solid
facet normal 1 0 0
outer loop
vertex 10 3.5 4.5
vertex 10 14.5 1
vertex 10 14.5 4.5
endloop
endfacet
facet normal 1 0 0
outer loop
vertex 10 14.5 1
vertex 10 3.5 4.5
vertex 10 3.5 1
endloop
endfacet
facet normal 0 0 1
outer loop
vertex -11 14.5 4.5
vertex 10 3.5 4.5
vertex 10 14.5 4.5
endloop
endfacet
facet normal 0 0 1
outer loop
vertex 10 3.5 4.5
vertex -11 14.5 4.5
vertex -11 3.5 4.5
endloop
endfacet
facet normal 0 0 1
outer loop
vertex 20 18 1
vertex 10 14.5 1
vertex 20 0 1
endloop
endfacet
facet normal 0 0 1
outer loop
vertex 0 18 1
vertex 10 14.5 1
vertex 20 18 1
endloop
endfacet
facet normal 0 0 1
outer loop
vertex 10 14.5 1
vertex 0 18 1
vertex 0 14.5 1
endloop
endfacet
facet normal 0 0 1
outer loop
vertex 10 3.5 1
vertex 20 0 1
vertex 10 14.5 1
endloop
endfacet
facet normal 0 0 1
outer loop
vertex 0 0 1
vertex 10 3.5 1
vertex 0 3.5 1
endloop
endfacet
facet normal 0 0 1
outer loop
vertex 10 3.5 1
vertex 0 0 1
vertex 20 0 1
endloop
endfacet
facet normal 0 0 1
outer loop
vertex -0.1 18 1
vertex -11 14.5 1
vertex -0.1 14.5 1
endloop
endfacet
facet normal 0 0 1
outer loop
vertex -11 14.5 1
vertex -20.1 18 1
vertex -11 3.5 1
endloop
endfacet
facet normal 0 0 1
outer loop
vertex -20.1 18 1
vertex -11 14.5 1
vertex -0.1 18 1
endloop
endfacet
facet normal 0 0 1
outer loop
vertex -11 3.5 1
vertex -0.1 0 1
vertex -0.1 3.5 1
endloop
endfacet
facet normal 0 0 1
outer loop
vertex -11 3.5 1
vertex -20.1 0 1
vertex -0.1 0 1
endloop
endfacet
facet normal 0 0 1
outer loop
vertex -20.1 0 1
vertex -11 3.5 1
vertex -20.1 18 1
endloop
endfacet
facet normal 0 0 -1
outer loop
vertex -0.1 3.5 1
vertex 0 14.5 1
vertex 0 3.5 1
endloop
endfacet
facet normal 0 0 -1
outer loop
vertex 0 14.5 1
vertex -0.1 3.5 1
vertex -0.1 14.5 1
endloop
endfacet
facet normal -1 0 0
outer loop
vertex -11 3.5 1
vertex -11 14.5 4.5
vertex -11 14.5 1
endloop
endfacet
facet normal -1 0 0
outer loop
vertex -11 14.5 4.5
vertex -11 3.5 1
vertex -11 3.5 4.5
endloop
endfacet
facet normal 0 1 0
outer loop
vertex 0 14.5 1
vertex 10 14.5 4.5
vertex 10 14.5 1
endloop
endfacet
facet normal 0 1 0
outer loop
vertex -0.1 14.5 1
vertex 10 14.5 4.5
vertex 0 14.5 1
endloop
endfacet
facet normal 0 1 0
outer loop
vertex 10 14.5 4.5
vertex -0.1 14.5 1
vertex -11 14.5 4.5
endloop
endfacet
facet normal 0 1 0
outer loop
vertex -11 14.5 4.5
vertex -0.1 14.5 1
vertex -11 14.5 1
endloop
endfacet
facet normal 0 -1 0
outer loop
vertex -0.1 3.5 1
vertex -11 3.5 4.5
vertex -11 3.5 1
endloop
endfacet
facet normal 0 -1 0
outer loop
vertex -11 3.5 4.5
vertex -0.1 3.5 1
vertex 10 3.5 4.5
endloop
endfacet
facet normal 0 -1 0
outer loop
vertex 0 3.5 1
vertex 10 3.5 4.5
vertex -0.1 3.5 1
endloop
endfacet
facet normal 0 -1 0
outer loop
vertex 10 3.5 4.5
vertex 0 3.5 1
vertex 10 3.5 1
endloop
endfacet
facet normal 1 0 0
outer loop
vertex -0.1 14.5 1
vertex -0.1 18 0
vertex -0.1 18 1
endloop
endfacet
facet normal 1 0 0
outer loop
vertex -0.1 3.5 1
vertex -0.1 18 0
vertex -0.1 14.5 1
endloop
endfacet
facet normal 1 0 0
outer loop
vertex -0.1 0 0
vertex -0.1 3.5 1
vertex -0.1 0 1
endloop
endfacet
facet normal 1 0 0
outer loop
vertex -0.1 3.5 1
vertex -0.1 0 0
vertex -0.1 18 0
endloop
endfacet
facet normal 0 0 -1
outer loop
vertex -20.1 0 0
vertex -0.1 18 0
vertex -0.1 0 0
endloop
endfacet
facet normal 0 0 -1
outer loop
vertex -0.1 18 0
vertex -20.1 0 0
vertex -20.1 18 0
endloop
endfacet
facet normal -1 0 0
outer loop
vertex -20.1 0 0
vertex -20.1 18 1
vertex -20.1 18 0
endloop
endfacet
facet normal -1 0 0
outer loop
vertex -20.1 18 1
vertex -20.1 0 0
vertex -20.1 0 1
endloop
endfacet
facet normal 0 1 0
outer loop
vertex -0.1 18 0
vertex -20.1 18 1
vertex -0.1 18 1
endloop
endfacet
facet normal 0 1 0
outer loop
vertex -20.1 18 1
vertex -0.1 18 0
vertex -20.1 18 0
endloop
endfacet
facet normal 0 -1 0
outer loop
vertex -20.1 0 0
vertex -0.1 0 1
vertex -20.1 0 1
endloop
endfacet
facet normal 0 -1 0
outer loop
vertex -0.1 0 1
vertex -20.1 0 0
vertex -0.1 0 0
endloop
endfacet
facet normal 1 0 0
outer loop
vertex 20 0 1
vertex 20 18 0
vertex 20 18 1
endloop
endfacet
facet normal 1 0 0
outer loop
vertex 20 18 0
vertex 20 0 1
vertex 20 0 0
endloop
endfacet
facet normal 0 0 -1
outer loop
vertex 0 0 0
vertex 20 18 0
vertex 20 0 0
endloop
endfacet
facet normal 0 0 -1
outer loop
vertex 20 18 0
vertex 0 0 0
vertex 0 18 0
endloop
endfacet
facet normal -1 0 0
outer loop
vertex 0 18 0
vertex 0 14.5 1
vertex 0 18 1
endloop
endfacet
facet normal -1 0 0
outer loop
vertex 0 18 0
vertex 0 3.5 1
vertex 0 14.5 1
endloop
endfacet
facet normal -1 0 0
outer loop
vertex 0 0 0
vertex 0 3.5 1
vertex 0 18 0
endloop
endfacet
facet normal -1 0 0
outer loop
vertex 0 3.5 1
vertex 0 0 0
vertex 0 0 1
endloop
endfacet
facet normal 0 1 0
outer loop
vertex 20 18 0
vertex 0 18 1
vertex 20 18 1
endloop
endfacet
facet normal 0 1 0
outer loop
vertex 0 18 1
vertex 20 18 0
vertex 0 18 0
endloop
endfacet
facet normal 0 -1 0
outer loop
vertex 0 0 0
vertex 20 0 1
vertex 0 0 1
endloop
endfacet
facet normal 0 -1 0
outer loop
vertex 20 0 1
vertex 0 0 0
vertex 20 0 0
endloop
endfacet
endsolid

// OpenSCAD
$fn=64;
/*
x=400;
y=180;
t=2;
/**/
x=40;
y=18;
t=1;

j=10;

translate([-x/2-.1,0,0])
cube([x/2,y,t]);

cube([x/2,y,t]);

// joint male
#translate([-j,y/2-j/4,t])
hull(){
    cube([j*2,j/2,.1]);
    
    translate([0,-j/4,j/4])
    cube([j*2,j,.1]);    
}

//joint female
difference(){
    
    translate([-j-t,y/2-j/2-t/2,t])
    cube([j*2+t,j+t,j/4+t]);
    
    translate([-j,y/2-j/4,t])
    hull(){
        cube([j*3,j/2,.1]);
        
        translate([0,-j/4,j/4])
        cube([j*3,j,.1]);    
    }
}    
